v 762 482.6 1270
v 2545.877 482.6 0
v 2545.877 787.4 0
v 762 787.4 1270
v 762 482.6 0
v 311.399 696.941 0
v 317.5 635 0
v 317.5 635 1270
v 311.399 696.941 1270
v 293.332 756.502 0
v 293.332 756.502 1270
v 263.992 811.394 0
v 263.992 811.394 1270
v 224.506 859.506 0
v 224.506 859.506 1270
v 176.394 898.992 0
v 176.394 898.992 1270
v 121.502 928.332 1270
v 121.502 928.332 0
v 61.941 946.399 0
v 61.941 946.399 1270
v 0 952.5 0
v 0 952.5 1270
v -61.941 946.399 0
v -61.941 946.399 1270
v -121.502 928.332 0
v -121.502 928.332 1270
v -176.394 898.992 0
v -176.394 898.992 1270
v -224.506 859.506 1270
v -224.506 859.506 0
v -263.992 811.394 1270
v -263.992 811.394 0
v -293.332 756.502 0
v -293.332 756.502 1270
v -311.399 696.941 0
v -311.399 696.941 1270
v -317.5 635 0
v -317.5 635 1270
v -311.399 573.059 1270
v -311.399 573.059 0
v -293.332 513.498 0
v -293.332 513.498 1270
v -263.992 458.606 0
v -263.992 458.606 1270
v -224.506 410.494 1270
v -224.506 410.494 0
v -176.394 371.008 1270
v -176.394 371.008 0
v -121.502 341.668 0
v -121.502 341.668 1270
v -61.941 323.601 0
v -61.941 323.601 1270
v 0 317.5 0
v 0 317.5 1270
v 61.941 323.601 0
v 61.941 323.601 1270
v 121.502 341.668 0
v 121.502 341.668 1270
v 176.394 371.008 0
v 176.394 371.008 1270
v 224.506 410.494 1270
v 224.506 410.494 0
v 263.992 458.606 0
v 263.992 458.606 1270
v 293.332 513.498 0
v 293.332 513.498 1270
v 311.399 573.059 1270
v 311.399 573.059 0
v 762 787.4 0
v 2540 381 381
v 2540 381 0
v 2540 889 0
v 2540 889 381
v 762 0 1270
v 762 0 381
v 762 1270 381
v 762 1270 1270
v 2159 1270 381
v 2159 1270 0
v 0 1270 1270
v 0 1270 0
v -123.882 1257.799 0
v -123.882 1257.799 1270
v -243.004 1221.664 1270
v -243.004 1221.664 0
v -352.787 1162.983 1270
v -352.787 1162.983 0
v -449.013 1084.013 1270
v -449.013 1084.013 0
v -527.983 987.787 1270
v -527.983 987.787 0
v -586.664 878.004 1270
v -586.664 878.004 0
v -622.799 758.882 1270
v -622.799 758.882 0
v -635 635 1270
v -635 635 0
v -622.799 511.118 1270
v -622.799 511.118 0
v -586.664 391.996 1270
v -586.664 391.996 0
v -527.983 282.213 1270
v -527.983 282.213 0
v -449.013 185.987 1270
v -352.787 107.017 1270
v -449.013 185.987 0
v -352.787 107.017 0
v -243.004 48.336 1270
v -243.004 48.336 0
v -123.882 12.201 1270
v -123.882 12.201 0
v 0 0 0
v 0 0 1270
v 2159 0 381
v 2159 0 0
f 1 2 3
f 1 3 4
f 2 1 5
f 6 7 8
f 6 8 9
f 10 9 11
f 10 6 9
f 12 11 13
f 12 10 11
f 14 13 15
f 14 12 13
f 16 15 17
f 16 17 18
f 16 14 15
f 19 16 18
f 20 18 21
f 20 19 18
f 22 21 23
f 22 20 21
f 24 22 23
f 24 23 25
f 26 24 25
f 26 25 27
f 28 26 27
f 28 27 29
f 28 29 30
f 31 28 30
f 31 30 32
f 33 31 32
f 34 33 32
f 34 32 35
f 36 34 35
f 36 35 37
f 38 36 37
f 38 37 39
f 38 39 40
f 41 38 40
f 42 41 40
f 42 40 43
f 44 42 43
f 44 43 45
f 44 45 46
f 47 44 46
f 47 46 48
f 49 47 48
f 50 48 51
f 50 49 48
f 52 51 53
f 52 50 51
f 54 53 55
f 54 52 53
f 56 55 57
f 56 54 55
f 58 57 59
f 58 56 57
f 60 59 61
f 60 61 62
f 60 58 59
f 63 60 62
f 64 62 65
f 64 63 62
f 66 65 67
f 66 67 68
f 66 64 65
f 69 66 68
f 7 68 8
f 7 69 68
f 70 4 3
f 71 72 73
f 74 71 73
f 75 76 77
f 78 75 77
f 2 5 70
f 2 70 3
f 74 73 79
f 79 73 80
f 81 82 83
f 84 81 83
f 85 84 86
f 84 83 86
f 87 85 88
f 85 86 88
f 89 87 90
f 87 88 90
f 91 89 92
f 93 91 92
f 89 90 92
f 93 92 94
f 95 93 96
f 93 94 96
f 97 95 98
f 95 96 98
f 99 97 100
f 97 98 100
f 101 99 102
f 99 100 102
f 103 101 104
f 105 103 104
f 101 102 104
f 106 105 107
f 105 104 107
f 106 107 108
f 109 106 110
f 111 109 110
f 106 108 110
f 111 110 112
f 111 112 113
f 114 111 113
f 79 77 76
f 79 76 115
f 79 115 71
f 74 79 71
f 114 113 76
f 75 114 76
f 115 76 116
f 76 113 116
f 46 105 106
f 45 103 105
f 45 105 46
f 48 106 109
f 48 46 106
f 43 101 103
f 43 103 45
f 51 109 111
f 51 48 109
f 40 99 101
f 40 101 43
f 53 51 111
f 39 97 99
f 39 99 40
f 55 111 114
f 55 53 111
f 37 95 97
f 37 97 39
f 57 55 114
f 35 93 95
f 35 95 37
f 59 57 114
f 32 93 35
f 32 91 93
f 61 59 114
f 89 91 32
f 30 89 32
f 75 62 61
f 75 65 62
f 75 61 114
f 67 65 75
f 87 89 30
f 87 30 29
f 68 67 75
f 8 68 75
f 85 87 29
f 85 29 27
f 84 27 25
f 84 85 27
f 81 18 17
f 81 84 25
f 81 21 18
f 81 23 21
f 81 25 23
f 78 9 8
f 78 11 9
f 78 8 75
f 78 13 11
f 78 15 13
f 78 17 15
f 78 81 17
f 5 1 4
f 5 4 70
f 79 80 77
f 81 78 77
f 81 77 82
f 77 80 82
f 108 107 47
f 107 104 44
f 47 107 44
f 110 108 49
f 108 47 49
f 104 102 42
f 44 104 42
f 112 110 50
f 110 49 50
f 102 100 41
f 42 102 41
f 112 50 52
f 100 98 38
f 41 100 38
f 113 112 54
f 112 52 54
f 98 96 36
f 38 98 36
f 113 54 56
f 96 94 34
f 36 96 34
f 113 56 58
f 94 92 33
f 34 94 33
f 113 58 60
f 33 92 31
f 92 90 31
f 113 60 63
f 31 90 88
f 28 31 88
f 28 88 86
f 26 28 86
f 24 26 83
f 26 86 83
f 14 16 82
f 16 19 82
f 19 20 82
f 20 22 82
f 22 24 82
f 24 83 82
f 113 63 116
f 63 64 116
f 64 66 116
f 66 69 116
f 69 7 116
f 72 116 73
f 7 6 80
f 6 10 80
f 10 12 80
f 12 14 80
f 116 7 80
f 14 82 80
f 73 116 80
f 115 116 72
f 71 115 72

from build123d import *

# Parameters (mm, degrees)
F0_R     = 317.5
F1_DEPTH = 1270
F2_DEPTH = 381
F4_START = -482.6
F4_DEPTH = 304.8


with BuildPart() as f1:
    # F0 (on Top) → F1 (new body)
    with BuildSketch(Plane.XY):
        with BuildLine():
            ThreePointArc((0, 1270), (-635, 635), (0, 0))
            Line((0, 0), (762, 0))
            Line((762, 0), (762, 1270))
            Line((762, 1270), (0, 1270))
        make_face()
        with Locations((0, 635)):
            Circle(F0_R, mode=Mode.SUBTRACT)
    extrude(amount=F1_DEPTH)

    # F0 (on Top) → F2 (join)
    with BuildSketch(Plane.XY):
        with BuildLine():
            ThreePointArc((0, 1270), (-635, 635), (0, 0))
            Line((0, 0), (762, 0))
            Line((762, 0), (762, 1270))
            Line((762, 1270), (0, 1270))
        make_face()
        with Locations((0, 635)):
            Circle(F0_R, mode=Mode.SUBTRACT)
        Polygon((762, 1270), (762, 0), (2159, 0), (2540, 381), (2540, 889), (2159, 1270), align=None)
    extrude(amount=F2_DEPTH)


with BuildPart() as f4:
    # F3 (on face) → F4 (new body)
    with BuildSketch(Plane.XZ.offset(F4_START)):
        Polygon((2159, 275.4302958878), (2010.7138858795, 381), (762, 381), (762, 0), (2159, 0), align=None)
        Polygon((2010.7138858795, 381), (762, 1270), (762, 381), align=None)
        Polygon((2545.8769798279, 0), (2159, 275.4302958878), (2159, 0), align=None)
    extrude(amount=-F4_DEPTH)


solid = Compound([f1.part, f4.part])
